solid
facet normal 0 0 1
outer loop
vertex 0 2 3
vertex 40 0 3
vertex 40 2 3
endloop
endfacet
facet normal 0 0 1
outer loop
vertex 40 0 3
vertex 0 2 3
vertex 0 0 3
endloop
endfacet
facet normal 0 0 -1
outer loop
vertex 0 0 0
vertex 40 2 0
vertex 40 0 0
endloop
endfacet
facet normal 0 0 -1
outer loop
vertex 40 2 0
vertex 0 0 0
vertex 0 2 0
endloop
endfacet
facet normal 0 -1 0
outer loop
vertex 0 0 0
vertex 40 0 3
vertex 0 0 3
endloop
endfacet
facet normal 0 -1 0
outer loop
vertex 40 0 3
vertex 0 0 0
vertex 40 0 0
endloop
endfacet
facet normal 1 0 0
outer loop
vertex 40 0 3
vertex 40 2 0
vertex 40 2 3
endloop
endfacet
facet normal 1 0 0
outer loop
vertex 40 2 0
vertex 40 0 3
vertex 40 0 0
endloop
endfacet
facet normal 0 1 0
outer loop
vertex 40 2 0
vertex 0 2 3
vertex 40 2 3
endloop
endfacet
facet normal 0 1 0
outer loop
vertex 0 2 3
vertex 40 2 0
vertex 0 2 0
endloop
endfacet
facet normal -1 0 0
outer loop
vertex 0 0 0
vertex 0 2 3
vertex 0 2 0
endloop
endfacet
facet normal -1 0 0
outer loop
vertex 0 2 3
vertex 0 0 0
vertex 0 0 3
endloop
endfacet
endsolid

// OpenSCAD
// Unsaved Native Agent acceptance buffer
width=40;
shape="round";
internalOffset=0.01;
module model() { cube([width,2,3]); }
model();
